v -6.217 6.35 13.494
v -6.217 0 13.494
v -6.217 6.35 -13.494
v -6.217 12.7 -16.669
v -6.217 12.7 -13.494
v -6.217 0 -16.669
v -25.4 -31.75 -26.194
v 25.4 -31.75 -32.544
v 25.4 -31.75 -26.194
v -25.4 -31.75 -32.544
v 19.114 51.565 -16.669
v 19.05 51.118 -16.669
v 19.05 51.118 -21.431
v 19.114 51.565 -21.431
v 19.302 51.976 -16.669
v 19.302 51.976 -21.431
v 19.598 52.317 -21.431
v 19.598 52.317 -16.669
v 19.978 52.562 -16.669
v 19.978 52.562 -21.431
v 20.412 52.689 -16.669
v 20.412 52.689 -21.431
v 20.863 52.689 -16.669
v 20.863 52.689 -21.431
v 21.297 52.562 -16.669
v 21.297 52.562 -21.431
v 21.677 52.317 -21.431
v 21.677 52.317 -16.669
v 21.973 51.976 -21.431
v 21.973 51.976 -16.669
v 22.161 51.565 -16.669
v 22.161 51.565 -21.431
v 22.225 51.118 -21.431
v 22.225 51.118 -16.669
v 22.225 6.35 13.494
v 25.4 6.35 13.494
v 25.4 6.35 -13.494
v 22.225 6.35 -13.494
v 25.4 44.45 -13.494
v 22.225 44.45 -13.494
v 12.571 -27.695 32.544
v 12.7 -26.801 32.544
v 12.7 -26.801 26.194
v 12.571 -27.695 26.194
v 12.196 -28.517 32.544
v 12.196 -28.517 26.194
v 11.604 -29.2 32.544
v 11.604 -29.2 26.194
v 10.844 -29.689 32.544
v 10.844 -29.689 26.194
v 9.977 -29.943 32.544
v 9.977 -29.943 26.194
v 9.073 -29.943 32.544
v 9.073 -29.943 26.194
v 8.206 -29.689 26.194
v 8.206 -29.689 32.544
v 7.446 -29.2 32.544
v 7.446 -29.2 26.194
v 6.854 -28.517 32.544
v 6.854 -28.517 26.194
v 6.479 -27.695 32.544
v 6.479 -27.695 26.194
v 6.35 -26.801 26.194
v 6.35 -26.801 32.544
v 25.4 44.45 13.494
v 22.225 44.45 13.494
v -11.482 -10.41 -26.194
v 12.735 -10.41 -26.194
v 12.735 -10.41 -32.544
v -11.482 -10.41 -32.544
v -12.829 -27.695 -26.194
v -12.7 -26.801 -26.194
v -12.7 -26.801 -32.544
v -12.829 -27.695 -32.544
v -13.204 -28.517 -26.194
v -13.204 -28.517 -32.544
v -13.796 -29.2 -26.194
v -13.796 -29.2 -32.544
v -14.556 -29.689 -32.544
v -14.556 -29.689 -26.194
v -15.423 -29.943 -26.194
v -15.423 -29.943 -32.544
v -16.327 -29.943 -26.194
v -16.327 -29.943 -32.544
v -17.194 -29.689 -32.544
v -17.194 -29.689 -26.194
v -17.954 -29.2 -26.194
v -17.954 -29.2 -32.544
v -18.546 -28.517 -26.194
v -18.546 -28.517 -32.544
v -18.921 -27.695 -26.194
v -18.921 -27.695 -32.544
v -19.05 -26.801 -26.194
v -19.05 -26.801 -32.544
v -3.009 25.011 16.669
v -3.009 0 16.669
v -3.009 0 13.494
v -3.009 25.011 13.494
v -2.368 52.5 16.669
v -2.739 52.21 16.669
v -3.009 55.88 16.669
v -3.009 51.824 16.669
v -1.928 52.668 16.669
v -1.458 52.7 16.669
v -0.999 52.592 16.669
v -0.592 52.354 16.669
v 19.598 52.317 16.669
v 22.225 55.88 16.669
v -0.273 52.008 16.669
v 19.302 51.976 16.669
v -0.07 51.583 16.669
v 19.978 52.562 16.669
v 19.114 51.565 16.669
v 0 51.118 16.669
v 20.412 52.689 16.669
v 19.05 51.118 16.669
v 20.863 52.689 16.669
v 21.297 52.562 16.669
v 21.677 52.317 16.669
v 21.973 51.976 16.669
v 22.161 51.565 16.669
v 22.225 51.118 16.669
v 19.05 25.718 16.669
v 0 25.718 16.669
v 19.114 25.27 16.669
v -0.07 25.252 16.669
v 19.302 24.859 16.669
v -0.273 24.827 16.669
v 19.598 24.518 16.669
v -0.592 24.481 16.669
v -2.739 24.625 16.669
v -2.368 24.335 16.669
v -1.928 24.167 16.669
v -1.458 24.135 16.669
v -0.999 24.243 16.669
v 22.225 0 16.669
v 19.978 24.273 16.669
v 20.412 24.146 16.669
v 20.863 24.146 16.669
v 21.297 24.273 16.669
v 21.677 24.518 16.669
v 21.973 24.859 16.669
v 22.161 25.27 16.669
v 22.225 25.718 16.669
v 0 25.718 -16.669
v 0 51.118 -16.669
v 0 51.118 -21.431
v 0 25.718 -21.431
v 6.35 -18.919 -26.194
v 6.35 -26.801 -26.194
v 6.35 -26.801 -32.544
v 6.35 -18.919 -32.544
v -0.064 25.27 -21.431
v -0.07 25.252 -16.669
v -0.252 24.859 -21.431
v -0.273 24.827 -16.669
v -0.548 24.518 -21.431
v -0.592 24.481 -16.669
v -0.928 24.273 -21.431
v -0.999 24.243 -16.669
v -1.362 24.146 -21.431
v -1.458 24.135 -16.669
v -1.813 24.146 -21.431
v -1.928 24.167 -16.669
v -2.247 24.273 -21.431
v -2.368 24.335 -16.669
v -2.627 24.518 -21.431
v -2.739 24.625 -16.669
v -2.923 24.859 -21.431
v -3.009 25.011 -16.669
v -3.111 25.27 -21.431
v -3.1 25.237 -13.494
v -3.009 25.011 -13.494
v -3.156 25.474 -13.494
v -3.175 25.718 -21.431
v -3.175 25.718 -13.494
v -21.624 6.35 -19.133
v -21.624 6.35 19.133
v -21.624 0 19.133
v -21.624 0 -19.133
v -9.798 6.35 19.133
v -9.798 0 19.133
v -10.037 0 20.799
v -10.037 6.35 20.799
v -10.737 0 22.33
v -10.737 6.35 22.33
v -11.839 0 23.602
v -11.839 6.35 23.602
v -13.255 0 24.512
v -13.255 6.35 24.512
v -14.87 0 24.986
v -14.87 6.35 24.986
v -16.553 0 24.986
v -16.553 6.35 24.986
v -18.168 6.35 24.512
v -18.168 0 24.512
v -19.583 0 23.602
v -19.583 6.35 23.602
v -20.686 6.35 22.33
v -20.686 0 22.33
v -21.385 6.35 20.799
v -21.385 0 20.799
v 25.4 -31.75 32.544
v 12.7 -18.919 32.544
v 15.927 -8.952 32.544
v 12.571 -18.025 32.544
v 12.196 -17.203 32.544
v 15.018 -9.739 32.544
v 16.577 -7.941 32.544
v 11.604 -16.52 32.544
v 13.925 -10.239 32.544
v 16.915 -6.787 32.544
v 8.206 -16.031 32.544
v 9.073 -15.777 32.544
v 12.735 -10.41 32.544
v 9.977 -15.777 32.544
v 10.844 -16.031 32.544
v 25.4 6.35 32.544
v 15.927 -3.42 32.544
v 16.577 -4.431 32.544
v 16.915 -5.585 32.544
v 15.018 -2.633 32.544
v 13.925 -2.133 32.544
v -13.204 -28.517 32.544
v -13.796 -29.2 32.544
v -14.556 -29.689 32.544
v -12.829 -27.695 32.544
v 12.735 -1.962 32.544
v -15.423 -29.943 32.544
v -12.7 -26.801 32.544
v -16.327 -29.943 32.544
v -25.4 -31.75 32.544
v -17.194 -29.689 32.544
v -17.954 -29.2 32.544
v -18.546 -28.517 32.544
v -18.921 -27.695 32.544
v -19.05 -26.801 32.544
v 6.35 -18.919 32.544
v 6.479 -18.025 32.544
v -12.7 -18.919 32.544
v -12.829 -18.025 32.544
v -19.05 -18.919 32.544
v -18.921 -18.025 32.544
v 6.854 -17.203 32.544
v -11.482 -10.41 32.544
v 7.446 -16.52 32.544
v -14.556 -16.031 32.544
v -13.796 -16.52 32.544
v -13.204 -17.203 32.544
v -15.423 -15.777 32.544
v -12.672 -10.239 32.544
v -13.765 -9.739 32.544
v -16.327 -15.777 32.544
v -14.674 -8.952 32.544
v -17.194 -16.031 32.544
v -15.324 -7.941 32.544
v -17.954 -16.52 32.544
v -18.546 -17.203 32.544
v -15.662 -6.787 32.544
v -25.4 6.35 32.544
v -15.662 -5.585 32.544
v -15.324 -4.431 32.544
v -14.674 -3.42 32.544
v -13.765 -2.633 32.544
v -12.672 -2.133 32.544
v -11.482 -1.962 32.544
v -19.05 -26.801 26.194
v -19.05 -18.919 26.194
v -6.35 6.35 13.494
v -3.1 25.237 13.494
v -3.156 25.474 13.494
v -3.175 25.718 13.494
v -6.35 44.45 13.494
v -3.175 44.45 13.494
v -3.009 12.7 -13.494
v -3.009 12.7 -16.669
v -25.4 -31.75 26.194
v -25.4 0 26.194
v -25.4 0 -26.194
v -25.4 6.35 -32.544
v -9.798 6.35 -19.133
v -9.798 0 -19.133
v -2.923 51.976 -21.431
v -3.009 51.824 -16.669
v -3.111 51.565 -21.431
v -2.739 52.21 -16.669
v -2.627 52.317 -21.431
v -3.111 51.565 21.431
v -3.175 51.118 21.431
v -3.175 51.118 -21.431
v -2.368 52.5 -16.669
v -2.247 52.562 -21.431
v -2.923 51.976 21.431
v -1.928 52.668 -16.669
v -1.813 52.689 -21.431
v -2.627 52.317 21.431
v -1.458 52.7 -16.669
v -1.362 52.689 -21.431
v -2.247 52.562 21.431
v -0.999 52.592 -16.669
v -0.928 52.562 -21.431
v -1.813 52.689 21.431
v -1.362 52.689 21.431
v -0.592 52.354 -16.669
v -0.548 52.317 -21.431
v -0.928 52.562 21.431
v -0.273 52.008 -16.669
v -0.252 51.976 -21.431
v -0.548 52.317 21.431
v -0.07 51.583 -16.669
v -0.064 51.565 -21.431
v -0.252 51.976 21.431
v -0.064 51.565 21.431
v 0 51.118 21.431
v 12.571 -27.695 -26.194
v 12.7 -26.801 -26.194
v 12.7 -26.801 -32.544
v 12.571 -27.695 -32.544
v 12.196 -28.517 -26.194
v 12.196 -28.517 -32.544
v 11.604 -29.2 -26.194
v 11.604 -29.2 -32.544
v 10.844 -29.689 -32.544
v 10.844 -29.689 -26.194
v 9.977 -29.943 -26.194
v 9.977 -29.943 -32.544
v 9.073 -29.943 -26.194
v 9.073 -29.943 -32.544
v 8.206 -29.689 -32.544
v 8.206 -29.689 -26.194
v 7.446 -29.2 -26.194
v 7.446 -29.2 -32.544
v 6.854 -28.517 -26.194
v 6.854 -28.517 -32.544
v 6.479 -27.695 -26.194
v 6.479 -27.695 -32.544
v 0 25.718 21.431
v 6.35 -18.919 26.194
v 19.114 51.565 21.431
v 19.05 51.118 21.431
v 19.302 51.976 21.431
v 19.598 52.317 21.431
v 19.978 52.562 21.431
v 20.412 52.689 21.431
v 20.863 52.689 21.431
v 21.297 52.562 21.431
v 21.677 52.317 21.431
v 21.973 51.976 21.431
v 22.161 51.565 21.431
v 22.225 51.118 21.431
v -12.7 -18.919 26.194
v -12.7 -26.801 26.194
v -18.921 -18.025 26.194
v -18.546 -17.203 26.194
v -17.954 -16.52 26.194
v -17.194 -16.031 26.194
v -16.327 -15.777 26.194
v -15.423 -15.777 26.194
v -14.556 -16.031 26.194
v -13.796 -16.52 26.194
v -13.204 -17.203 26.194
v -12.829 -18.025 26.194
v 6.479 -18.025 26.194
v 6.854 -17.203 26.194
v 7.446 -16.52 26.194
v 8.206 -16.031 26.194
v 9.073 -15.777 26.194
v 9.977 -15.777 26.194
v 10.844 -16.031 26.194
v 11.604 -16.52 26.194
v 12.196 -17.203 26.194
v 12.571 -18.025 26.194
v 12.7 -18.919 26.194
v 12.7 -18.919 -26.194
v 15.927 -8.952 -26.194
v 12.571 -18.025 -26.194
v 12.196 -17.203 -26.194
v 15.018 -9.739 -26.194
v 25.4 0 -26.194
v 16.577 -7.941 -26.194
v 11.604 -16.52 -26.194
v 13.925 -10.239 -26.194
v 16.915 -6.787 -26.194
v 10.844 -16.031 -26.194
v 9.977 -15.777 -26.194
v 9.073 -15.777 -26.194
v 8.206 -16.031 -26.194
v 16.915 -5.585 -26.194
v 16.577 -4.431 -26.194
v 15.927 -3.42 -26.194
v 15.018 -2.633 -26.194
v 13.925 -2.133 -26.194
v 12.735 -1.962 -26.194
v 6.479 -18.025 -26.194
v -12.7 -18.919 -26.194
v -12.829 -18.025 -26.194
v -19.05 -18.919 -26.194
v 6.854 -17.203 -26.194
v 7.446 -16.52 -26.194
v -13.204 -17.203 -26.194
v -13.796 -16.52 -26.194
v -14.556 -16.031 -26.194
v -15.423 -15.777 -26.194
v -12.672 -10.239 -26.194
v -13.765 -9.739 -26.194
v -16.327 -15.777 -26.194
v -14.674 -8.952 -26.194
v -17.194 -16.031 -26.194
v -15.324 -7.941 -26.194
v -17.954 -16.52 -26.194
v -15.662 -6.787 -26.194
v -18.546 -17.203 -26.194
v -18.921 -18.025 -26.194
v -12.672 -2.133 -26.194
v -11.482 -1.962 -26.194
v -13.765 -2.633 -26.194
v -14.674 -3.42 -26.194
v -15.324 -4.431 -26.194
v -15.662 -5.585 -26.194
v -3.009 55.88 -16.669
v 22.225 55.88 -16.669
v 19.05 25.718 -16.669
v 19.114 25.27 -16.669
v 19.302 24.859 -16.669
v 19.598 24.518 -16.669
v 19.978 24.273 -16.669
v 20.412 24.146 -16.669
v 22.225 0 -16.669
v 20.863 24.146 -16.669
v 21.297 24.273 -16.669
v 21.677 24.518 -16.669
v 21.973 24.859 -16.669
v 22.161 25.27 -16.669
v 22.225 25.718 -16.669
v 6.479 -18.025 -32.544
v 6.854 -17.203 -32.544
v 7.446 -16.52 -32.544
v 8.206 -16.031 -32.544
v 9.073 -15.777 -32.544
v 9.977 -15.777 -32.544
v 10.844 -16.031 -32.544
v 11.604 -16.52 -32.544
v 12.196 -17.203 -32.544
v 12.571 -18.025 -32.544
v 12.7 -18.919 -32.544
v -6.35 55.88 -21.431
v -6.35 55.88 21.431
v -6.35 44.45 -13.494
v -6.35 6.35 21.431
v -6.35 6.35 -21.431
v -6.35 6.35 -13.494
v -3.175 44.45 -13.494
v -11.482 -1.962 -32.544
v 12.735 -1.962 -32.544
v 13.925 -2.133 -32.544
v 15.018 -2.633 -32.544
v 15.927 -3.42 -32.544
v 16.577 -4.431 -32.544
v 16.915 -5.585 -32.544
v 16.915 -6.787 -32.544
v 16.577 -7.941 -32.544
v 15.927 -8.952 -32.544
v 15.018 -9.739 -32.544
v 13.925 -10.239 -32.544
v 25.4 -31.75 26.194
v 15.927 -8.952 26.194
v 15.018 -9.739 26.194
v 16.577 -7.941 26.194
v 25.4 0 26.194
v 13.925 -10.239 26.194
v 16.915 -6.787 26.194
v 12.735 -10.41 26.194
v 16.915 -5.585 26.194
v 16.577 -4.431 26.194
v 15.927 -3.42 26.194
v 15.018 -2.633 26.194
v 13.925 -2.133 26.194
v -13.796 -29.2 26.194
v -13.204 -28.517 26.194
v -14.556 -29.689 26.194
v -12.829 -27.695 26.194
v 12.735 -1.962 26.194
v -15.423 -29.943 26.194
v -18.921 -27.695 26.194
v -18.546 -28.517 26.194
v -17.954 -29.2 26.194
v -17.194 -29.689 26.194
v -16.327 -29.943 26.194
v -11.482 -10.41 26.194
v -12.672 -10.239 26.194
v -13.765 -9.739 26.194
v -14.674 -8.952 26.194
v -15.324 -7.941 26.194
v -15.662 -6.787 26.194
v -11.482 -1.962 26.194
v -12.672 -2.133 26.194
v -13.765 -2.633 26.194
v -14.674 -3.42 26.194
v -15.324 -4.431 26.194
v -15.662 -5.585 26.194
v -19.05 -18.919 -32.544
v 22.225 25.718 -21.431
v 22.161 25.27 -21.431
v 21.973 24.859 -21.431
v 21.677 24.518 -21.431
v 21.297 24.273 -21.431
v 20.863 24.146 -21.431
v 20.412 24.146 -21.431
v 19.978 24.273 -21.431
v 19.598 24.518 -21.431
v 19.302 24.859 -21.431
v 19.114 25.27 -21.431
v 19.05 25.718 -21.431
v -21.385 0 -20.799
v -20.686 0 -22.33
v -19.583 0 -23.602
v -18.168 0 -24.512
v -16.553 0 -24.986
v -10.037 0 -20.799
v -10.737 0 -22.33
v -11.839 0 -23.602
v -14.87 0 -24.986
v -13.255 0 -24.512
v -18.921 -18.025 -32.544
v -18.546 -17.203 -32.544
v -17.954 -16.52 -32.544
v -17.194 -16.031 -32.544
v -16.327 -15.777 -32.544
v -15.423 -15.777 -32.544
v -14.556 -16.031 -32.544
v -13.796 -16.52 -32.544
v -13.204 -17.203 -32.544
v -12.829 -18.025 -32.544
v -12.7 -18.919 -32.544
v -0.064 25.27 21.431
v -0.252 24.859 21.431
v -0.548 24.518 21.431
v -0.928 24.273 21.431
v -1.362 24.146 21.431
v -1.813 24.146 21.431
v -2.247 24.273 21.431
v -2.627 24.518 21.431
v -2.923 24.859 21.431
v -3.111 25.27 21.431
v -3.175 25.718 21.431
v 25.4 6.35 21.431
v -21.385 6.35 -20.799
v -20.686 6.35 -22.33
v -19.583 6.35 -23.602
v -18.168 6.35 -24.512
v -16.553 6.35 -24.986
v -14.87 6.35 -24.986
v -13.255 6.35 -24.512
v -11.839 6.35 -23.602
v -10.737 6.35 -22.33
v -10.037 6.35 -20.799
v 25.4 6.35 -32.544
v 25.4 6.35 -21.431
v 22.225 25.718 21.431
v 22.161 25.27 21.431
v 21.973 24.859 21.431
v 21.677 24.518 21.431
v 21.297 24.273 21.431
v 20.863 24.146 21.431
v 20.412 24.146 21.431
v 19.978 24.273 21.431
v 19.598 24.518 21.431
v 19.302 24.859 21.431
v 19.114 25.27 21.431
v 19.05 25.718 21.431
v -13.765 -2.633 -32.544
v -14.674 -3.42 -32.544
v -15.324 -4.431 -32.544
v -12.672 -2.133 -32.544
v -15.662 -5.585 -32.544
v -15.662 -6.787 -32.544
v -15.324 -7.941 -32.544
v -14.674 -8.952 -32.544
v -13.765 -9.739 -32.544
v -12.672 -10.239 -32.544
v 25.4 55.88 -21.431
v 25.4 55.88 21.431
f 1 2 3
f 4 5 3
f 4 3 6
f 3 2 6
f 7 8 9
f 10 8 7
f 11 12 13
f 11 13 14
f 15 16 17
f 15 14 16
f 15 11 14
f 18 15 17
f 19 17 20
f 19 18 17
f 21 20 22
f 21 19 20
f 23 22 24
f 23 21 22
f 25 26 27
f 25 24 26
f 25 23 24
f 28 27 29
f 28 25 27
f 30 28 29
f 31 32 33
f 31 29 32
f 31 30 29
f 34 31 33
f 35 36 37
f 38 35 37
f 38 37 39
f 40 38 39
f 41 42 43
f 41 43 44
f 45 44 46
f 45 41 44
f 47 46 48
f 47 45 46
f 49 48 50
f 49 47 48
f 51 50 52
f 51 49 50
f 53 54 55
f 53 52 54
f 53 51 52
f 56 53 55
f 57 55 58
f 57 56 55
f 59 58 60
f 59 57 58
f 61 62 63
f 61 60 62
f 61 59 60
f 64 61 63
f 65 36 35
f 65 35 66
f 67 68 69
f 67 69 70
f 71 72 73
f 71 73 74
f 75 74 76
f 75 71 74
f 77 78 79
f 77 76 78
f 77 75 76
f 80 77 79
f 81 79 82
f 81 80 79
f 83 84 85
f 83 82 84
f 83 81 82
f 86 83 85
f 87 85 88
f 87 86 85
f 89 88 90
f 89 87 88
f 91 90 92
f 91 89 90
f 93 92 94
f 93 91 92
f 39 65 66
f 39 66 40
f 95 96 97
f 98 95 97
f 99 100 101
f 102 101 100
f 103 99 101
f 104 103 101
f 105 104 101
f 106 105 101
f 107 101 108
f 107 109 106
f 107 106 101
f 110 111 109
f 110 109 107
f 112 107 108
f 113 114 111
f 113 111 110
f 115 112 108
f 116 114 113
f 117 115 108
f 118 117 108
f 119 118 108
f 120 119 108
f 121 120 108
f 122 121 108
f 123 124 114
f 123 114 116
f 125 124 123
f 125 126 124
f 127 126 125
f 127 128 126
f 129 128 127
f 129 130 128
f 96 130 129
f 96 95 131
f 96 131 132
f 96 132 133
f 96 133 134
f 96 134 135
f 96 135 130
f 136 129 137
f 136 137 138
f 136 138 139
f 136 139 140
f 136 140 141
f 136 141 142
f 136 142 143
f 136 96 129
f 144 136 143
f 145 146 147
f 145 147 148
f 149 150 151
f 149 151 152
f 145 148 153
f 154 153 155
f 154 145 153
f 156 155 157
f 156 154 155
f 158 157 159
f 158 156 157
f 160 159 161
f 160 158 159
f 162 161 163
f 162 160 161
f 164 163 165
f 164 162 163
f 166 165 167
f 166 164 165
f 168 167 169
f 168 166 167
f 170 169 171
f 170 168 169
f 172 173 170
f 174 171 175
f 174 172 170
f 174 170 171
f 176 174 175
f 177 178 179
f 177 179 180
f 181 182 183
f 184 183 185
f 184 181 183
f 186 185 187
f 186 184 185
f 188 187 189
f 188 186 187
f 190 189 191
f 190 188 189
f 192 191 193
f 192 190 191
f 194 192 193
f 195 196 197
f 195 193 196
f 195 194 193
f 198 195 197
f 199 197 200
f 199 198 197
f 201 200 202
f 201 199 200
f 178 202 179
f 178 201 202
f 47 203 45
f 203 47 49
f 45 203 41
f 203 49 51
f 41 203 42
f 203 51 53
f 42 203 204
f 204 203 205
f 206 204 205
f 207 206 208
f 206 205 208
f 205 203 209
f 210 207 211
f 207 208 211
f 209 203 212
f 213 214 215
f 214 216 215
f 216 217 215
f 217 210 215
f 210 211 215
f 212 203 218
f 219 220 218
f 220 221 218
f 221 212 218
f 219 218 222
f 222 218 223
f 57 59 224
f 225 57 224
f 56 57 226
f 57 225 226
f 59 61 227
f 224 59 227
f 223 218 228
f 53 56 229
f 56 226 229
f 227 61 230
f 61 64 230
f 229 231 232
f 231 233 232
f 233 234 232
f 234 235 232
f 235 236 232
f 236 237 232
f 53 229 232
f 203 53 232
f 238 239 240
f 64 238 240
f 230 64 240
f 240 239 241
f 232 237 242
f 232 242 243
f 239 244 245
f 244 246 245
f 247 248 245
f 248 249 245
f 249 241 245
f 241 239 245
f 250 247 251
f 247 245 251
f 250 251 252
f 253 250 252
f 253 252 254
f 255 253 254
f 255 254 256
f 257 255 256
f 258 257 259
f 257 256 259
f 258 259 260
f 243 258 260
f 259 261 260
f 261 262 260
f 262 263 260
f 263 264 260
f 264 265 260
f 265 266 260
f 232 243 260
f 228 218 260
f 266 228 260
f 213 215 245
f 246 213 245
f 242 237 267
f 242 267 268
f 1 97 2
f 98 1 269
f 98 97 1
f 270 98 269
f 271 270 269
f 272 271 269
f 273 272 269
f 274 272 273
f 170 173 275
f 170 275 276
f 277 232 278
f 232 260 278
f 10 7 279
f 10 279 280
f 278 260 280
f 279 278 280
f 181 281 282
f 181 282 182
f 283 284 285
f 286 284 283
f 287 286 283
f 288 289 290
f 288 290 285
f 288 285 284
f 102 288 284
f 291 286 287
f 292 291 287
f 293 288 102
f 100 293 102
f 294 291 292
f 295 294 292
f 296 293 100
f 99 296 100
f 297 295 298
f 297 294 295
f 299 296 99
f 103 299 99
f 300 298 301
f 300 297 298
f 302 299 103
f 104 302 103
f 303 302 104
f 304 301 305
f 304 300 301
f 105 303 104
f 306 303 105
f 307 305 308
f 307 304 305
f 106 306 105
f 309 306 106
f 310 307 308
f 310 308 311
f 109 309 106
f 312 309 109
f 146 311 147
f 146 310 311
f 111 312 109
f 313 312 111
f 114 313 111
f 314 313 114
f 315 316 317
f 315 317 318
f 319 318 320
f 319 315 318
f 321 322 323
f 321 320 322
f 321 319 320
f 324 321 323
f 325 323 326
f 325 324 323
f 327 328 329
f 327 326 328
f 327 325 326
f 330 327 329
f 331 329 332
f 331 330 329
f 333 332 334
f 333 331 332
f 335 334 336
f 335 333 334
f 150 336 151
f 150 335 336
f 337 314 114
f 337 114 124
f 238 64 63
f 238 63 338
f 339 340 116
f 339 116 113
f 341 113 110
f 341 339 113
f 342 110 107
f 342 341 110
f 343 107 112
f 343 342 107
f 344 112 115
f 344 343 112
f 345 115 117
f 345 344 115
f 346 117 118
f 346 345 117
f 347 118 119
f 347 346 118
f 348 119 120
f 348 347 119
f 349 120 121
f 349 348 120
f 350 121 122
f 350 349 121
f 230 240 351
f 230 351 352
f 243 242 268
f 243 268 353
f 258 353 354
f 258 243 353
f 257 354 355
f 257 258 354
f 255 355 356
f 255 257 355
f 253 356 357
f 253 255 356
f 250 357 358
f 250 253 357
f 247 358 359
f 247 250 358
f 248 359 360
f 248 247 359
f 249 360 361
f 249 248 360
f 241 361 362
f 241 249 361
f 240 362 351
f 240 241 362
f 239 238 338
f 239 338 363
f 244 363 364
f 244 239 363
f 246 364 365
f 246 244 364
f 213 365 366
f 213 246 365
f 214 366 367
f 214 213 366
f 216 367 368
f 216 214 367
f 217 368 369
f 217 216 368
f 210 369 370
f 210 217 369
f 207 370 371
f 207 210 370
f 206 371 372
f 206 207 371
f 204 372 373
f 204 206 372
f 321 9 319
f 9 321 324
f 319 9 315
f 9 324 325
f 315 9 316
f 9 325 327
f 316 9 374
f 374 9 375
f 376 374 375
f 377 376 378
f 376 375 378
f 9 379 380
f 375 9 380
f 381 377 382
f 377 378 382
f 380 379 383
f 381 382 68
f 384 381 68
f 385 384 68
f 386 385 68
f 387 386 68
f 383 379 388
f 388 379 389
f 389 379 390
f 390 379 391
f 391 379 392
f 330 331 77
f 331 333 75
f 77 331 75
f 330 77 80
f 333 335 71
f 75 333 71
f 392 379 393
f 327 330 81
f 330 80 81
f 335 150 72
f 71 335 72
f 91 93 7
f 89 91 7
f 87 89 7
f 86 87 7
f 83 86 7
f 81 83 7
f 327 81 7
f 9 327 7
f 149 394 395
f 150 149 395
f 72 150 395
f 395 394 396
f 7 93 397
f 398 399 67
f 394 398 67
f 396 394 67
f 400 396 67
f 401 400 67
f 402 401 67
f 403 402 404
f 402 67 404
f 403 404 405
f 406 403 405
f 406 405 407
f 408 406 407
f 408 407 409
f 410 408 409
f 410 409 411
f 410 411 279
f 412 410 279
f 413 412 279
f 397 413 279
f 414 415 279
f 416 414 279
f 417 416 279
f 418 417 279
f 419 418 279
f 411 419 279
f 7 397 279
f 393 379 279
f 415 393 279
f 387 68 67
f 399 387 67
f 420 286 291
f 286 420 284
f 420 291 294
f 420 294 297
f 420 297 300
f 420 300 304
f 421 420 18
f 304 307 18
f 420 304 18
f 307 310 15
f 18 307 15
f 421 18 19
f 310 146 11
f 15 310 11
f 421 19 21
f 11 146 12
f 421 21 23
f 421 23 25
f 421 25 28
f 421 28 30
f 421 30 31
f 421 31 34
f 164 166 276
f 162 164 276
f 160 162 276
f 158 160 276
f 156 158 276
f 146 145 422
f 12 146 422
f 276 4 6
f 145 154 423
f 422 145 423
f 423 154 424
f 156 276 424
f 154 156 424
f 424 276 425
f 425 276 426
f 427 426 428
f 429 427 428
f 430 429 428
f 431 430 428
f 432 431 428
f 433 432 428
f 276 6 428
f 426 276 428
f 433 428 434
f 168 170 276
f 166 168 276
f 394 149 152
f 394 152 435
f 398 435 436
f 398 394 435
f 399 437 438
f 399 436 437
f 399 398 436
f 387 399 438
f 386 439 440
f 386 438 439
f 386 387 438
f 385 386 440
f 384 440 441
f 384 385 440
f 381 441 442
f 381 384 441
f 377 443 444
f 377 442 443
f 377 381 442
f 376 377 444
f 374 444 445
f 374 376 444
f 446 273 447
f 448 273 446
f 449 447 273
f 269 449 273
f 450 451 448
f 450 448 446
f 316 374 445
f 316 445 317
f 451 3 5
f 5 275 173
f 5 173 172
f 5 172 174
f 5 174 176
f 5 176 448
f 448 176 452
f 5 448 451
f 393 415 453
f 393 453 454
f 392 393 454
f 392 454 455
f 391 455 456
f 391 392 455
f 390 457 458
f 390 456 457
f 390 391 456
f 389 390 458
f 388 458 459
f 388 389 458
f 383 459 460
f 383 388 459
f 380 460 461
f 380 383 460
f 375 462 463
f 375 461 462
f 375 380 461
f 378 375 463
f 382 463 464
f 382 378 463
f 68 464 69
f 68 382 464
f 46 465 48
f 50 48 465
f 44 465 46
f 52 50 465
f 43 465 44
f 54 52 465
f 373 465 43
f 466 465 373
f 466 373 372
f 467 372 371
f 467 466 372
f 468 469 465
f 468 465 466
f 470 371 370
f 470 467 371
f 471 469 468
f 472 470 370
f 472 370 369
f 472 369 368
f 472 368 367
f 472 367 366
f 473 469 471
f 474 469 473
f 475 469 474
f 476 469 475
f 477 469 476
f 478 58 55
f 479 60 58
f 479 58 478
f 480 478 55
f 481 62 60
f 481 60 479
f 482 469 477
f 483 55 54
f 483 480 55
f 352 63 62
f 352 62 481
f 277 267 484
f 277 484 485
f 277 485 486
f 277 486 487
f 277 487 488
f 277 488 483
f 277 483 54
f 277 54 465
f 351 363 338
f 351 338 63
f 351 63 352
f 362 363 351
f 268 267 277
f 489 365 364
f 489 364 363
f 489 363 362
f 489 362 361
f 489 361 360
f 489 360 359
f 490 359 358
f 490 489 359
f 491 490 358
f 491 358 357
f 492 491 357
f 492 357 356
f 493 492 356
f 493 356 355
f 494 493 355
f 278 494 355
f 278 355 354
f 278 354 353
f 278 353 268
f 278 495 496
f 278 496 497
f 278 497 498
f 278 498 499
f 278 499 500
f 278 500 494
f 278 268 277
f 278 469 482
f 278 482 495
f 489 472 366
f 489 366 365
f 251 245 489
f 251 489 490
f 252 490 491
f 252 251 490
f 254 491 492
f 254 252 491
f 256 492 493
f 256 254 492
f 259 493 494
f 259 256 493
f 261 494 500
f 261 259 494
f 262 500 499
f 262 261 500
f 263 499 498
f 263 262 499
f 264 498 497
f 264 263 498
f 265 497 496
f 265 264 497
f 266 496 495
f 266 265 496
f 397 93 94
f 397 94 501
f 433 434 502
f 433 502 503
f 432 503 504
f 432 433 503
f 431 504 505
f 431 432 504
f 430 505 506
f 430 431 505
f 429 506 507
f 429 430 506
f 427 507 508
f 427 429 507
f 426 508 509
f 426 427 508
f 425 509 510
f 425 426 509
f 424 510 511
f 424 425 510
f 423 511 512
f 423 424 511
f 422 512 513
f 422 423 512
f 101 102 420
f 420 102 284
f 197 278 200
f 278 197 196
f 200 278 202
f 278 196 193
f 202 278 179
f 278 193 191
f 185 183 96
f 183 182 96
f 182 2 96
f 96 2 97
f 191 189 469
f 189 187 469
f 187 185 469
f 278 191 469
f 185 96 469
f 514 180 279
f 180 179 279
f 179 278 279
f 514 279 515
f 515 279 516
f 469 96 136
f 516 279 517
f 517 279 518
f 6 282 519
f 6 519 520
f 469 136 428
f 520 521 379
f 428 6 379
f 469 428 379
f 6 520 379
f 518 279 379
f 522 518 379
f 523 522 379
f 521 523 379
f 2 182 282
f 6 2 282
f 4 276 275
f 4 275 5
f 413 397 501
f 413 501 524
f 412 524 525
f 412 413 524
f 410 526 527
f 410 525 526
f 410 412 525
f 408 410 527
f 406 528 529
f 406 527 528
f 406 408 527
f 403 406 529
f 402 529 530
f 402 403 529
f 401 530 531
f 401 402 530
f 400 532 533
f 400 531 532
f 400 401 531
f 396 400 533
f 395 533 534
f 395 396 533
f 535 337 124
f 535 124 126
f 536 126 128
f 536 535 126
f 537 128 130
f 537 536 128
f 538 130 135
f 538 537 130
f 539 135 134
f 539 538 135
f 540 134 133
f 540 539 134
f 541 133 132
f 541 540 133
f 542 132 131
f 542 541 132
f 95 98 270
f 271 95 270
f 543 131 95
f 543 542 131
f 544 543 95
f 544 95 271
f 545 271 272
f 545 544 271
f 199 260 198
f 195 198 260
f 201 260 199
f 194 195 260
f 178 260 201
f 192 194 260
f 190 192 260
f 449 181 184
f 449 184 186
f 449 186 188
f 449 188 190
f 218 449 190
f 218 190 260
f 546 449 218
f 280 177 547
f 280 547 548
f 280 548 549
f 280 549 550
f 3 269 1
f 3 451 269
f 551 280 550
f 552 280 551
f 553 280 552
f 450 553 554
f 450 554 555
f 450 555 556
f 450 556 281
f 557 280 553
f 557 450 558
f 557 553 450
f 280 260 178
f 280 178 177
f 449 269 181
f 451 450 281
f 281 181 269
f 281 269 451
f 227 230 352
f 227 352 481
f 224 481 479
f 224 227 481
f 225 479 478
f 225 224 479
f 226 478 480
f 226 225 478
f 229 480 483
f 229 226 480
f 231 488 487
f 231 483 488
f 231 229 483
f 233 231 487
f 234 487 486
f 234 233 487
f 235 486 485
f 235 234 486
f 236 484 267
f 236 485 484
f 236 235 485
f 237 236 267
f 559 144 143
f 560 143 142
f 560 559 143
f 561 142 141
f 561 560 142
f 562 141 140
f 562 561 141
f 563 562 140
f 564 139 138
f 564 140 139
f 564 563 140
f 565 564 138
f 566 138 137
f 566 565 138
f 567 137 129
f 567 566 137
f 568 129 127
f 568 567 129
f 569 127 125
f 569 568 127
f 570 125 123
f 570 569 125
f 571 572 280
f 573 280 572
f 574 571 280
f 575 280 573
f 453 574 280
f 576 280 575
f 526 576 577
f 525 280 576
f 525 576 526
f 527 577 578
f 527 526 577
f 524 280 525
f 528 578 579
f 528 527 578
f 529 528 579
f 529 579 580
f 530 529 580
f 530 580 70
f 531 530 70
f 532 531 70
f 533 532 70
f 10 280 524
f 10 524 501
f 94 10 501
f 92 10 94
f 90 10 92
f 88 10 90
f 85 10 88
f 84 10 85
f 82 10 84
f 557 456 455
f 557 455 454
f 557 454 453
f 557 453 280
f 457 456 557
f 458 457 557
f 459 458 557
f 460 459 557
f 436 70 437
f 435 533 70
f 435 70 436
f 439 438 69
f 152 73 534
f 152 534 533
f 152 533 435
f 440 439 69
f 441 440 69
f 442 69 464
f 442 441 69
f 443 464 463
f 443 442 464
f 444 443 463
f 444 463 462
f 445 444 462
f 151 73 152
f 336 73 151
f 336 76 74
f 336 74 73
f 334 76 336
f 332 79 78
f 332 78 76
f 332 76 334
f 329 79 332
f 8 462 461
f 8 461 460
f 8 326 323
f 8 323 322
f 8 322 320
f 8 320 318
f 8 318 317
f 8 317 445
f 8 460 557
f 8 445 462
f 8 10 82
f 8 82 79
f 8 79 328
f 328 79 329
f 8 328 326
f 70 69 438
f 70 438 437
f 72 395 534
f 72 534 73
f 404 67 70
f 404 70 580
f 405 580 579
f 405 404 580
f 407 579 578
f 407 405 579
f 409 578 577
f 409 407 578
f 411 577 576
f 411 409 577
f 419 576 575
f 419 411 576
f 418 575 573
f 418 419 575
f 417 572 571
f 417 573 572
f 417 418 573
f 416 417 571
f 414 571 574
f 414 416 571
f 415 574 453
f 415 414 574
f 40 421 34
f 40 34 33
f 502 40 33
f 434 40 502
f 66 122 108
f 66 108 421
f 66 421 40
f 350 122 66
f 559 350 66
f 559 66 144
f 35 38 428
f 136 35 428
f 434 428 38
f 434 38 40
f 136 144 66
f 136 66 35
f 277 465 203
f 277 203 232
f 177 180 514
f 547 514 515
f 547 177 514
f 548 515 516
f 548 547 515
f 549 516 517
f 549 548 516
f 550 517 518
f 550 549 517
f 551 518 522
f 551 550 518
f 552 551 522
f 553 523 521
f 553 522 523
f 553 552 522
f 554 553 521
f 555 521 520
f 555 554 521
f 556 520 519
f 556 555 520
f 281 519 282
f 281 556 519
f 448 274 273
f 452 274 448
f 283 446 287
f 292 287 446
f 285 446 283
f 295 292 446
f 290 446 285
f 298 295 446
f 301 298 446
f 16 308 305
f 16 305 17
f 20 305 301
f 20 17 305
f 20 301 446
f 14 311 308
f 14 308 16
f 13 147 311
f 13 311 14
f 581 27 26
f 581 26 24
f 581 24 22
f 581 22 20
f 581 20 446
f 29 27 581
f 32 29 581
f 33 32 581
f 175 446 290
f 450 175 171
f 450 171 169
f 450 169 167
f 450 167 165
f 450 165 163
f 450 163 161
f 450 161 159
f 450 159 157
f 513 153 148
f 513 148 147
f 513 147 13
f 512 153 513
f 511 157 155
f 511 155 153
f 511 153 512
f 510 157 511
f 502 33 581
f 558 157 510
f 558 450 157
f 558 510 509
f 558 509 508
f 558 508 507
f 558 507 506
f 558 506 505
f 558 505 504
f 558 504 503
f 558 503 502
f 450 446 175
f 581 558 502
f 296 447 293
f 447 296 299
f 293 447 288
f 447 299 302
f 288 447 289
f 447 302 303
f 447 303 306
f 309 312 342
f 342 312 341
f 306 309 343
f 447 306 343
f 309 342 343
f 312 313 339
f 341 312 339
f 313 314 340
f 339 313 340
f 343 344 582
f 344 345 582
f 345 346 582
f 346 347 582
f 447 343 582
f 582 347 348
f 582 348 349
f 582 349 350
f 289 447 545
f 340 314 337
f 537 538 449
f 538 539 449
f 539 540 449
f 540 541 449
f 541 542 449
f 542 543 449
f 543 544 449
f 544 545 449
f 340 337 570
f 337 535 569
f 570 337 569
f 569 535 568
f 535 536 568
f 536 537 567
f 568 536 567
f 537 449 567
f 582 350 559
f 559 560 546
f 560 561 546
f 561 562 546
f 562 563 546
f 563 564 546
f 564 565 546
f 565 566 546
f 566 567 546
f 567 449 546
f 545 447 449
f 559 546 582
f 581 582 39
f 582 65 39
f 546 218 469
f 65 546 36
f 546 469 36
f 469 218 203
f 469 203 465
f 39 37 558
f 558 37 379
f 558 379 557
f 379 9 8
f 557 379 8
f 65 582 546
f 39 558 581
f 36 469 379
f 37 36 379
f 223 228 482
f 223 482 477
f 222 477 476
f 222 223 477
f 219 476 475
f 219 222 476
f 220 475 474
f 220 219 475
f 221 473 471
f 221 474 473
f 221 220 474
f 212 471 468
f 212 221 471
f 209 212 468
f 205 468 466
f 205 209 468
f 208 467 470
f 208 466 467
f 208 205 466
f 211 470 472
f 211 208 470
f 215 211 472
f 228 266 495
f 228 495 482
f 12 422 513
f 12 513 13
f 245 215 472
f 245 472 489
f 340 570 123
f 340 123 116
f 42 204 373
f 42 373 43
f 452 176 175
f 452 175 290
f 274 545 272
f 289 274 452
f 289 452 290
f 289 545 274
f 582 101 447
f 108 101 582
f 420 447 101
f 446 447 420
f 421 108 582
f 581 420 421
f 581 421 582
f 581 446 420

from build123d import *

# Parameters (mm, degrees)
SKETCH1_W           = 50.8
SKETCH1_H           = 65.0875
BOSS_EXTRUDE1_DEPTH = 6.35
SKETCH2_W           = 50.8
SKETCH2_H           = 6.35
BOSS_EXTRUDE2_DEPTH = 31.75
SKETCH4_W           = 25.233918668
SKETCH4_H           = 33.3375
CUT_EXTRUDE1_DEPTH  = 31.75
SKETCH5_W           = 31.75
SKETCH5_H           = 42.8625
BOSS_EXTRUDE3_DEPTH = 49.53
SKETCH4_2_W         = 25.233918668
SKETCH4_2_H         = 33.3375
CUT_EXTRUDE2_DEPTH  = 58.7375
CUT_EXTRUDE4_DEPTH  = 58.7375
SKETCH8_W           = 26.9875
SKETCH8_H           = 38.1
CUT_EXTRUDE7_DEPTH  = 58.7375
SKETCH12_W          = 3.208041114
SKETCH12_H          = 30.1625
CUT_EXTRUDE13_DEPTH = 12.7
CUT_EXTRUDE14_DEPTH = 76.2
CUT_EXTRUDE15_DEPTH = 76.2
CUT_EXTRUDE16_DEPTH = 76.2


with BuildPart() as part:
    # Sketch1 → Boss-Extrude1 (new body)
    with BuildSketch(Plane(origin=(0, 0, 0), x_dir=(1, 0, 0), z_dir=(0, 1, 0))):
        Rectangle(SKETCH1_W, SKETCH1_H)
    extrude(amount=BOSS_EXTRUDE1_DEPTH)

    # Sketch2 → Boss-Extrude2 (add)
    with BuildSketch(Plane(origin=(0, 0, 0), x_dir=(-1, 0, 0), z_dir=(0, -1, 0))):
        with Locations((0, -29.36875)):
            Rectangle(SKETCH2_W, SKETCH2_H)
        with Locations((0, 29.36875)):
            Rectangle(SKETCH2_W, SKETCH2_H)
    extrude(amount=BOSS_EXTRUDE2_DEPTH)

    # Sketch4 → Cut-Extrude1 (cut)
    with BuildSketch(Plane(origin=(0, 6.35, 0), x_dir=(1, 0, 0), z_dir=(0, 1, 0))):
        with Locations((9.608040666, 0)):
            Rectangle(SKETCH4_W, SKETCH4_H)
    extrude(amount=-CUT_EXTRUDE1_DEPTH, mode=Mode.SUBTRACT)

    # Sketch5 → Boss-Extrude3 (add)
    with BuildSketch(Plane(origin=(0, 6.35, 0), x_dir=(1, 0, 0), z_dir=(0, 1, 0))):
        with Locations((9.525, 0)):
            Rectangle(SKETCH5_W, SKETCH5_H)
    extrude(amount=BOSS_EXTRUDE3_DEPTH)

    # Sketch4<2> → Cut-Extrude2 (cut)
    with BuildSketch(Plane(origin=(0, 6.35, 0), x_dir=(1, 0, 0), z_dir=(0, 1, 0))):
        with Locations((9.608040666, 0)):
            Rectangle(SKETCH4_2_W, SKETCH4_2_H)
    extrude(amount=CUT_EXTRUDE2_DEPTH, mode=Mode.SUBTRACT)

    # Sketch7 → Cut-Extrude4 (cut)
    with BuildSketch(Plane.XY.offset(21.43125)):
        with BuildLine():
            Line((19.05, 25.7175), (19.05, 51.1175))
            ThreePointArc((19.05, 51.1175), (20.6375, 52.705), (22.225, 51.1175))
            Line((22.225, 51.1175), (22.225, 25.7175))
            ThreePointArc((22.225, 25.7175), (20.6375, 24.13), (19.05, 25.7175))
        make_face()
        with BuildLine():
            Line((0, 51.1175), (0, 25.7175))
            ThreePointArc((0, 25.7175), (-1.5875, 24.13), (-3.175, 25.7175))
            Line((-3.175, 25.7175), (-3.175, 51.1175))
            ThreePointArc((-3.175, 51.1175), (-1.5875, 52.705), (0, 51.1175))
        make_face()
    extrude(amount=-CUT_EXTRUDE4_DEPTH, mode=Mode.SUBTRACT)

    # Sketch8 → Cut-Extrude7 (cut)
    with BuildSketch(Plane(origin=(25.4, 0, 0), x_dir=(0, 0, -1), z_dir=(1, 0, 0))):
        with Locations((0, 25.4)):
            Rectangle(SKETCH8_W, SKETCH8_H)
    extrude(amount=-CUT_EXTRUDE7_DEPTH, mode=Mode.SUBTRACT)

    # Sketch12 → Cut-Extrude13 (cut)
    with BuildSketch(Plane(origin=(0, 0, 0), x_dir=(-1, 0, 0), z_dir=(0, -1, 0))):
        with Locations((4.612939225, 1.5875)):
            Rectangle(SKETCH12_W, SKETCH12_H)
    extrude(amount=-CUT_EXTRUDE13_DEPTH, mode=Mode.SUBTRACT)

    # Sketch14 → Cut-Extrude14 (cut)
    with BuildSketch(Plane.XY.offset(32.54375)):
        with BuildLine():
            Line((12.7, -18.919342158), (12.7, -26.800657842))
            ThreePointArc((12.7, -26.800657842), (9.525, -29.975657842), (6.35, -26.800657842))
            Line((6.35, -26.800657842), (6.35, -18.919342158))
            ThreePointArc((6.35, -18.919342158), (9.525, -15.744342158), (12.7, -18.919342158))
        make_face()
        with BuildLine():
            Line((-12.7, -18.919342158), (-12.7, -26.800657842))
            ThreePointArc((-12.7, -26.800657842), (-15.875, -29.975657842), (-19.05, -26.800657842))
            Line((-19.05, -26.800657842), (-19.05, -18.919342158))
            ThreePointArc((-19.05, -18.919342158), (-15.875, -15.744342158), (-12.7, -18.919342158))
        make_face()
    extrude(amount=-CUT_EXTRUDE14_DEPTH, mode=Mode.SUBTRACT)

    # Sketch15 → Cut-Extrude15 (cut)
    with BuildSketch(Plane.XY.offset(32.54375)):
        with BuildLine():
            Line((-11.481562965, -1.962227272), (12.734603348, -1.962227272))
            ThreePointArc((12.734603348, -1.962227272), (16.958353287, -6.18597721), (12.734603348, -10.409727149))
            Line((12.734603348, -10.409727149), (-11.481562965, -10.409727149))
            ThreePointArc((-11.481562965, -10.409727149), (-15.705312903, -6.18597721), (-11.481562965, -1.962227272))
        make_face()
    extrude(amount=-CUT_EXTRUDE15_DEPTH, mode=Mode.SUBTRACT)

    # Sketch16 → Cut-Extrude16 (cut)
    with BuildSketch(Plane(origin=(0, 6.35, 0), x_dir=(1, 0, 0), z_dir=(0, 1, 0))):
        with BuildLine():
            Line((-9.797813027, 19.133291295), (-9.797813027, -19.133291295))
            ThreePointArc((-9.797813027, -19.133291295), (-15.71106294, -25.046541209), (-21.624312854, -19.133291295))
            Line((-21.624312854, -19.133291295), (-21.624312854, 19.133291295))
            ThreePointArc((-21.624312854, 19.133291295), (-15.71106294, 25.046541209), (-9.797813027, 19.133291295))
        make_face()
    extrude(amount=-CUT_EXTRUDE16_DEPTH, mode=Mode.SUBTRACT)


solid = part.part
